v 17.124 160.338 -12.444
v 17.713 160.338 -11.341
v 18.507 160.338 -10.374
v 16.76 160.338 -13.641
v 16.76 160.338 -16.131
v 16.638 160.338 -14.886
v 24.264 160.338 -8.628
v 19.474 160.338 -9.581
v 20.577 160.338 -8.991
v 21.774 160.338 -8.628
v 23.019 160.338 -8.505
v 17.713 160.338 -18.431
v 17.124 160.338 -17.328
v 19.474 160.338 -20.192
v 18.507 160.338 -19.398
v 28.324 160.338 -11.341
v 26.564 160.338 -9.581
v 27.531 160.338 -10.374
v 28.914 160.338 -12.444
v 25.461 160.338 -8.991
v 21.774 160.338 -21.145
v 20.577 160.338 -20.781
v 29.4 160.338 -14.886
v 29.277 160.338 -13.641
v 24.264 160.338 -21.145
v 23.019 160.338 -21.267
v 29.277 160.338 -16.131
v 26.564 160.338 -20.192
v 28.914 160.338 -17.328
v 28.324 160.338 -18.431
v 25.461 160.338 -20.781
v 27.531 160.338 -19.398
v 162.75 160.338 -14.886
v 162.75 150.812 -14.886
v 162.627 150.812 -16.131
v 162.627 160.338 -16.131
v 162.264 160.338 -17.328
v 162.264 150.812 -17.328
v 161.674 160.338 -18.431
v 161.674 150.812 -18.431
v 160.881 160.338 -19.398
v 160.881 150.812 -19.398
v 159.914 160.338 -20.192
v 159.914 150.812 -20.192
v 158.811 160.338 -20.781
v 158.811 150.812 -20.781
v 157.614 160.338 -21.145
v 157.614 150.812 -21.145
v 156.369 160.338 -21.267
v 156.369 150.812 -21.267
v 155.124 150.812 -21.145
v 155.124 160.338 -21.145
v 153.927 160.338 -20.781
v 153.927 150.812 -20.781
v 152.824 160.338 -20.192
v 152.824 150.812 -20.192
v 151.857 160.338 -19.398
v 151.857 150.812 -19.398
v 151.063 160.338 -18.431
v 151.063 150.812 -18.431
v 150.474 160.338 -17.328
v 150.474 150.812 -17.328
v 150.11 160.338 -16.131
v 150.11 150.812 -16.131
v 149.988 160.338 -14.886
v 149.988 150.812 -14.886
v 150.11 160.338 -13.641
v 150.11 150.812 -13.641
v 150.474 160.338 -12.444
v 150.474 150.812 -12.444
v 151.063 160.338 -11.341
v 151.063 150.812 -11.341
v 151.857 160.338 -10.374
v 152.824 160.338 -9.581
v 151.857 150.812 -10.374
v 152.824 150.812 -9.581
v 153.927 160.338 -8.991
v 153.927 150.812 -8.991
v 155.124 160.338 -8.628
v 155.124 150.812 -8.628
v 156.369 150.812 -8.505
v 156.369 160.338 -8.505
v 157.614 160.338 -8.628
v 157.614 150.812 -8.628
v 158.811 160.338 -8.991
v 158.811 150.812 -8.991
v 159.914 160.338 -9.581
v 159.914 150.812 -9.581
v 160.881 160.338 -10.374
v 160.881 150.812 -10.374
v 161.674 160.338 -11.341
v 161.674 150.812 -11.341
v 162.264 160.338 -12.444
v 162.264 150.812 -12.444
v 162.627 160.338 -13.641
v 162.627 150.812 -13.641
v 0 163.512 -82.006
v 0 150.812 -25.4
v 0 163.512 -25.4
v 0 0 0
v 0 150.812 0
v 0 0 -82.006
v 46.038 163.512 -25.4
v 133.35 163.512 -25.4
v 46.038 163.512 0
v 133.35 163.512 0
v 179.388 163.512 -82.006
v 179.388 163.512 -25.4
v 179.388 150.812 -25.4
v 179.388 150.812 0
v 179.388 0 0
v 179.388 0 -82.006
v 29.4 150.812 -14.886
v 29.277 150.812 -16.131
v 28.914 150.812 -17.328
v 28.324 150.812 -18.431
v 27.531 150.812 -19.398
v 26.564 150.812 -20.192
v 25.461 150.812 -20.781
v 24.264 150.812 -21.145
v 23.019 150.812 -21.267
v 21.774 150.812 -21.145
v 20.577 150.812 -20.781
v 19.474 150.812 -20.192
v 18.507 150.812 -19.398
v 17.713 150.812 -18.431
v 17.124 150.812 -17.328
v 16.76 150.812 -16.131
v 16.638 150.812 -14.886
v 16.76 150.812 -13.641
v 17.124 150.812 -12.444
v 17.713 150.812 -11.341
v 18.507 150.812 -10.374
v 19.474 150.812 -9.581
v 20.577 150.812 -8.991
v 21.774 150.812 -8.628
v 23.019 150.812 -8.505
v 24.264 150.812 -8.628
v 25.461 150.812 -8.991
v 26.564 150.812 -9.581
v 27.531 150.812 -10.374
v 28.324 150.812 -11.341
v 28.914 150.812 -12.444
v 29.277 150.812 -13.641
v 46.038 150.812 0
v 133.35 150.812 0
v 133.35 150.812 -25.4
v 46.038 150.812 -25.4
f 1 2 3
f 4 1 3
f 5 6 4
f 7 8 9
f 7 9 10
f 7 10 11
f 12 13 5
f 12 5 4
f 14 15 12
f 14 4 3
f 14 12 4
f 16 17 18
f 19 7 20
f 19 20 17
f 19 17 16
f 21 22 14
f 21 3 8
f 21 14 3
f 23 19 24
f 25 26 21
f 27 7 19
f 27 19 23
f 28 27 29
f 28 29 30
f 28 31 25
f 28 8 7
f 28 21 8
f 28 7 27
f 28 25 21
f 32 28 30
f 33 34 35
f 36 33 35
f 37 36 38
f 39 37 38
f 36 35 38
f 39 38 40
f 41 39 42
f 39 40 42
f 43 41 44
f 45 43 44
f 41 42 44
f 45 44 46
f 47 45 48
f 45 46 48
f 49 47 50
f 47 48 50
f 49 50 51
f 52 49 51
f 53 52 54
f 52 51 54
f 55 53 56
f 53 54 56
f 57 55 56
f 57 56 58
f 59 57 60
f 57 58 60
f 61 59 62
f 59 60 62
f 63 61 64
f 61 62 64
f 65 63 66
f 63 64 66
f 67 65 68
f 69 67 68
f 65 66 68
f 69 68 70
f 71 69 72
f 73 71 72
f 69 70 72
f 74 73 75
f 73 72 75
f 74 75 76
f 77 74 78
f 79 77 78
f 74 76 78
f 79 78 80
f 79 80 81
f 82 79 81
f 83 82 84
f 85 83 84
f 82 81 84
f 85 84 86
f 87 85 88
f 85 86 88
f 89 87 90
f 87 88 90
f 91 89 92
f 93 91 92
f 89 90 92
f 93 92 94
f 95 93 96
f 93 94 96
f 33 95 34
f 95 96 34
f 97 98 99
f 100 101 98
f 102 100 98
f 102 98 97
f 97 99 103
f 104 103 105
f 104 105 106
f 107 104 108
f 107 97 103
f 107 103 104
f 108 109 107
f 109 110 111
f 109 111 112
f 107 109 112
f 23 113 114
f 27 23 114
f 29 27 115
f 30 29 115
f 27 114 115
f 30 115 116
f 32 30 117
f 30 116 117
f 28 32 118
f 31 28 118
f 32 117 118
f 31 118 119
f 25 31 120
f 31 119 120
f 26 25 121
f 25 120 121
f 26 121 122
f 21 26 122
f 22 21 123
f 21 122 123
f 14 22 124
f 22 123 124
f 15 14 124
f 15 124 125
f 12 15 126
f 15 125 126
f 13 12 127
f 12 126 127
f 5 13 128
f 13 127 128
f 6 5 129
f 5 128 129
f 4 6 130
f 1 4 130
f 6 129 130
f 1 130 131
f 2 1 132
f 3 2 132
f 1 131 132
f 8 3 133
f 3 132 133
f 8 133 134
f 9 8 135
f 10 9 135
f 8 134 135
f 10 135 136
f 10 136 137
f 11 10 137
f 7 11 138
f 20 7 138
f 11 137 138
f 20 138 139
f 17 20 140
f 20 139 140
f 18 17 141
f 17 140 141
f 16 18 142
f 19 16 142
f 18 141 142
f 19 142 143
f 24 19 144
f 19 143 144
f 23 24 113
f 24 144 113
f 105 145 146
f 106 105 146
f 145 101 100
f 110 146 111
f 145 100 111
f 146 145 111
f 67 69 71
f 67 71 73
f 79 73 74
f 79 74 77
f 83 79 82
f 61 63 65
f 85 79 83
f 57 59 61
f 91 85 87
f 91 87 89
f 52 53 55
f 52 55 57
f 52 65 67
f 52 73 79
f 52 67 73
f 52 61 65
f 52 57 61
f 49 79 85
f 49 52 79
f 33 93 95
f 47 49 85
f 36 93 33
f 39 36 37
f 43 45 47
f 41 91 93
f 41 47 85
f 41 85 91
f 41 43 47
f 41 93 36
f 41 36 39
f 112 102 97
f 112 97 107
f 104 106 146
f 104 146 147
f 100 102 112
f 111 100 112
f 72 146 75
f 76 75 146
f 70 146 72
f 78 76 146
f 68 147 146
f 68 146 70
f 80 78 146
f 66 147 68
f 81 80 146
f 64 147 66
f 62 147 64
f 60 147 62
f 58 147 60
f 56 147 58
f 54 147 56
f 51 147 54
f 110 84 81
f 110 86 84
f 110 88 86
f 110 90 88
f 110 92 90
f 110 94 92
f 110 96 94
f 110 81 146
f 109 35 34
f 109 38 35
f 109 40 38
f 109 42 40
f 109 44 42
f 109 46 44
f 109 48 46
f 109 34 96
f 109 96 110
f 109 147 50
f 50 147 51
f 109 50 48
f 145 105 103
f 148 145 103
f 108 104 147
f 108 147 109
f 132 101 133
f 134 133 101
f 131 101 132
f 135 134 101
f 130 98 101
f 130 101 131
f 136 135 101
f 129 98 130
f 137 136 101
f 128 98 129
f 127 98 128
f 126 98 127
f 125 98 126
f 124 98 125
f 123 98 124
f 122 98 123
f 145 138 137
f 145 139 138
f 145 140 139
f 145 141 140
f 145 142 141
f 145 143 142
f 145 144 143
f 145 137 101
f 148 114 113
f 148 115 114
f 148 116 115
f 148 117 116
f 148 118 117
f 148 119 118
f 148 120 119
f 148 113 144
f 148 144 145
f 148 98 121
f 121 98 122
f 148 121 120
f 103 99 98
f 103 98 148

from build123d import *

# Parameters (mm, degrees)
SKETCH1_W           = 179.3875
SKETCH1_H           = 82.005714286
BOSS_EXTRUDE1_DEPTH = 163.5125
SKETCH2_W           = 46.0375
SKETCH2_H           = 25.4
CUT_EXTRUDE1_DEPTH  = 12.7
SKETCH3_R           = 6.380960286
BOSS_EXTRUDE2_DEPTH = 9.525


with BuildPart() as part:
    # Sketch1 → Boss-Extrude1 (new body)
    with BuildSketch(Plane(origin=(0, 0, 0), x_dir=(1, 0, 0), z_dir=(0, 1, 0))):
        with Locations((89.69375, 41.002857143)):
            Rectangle(SKETCH1_W, SKETCH1_H)
    extrude(amount=BOSS_EXTRUDE1_DEPTH)

    # Sketch2 → Cut-Extrude1 (cut)
    with BuildSketch(Plane(origin=(0, 163.5125, 0), x_dir=(1, 0, 0), z_dir=(0, 1, 0))):
        with Locations((23.01875, 12.7)):
            Rectangle(SKETCH2_W, SKETCH2_H)
        with Locations((156.36875, 12.7)):
            Rectangle(SKETCH2_W, SKETCH2_H)
    extrude(amount=-CUT_EXTRUDE1_DEPTH, mode=Mode.SUBTRACT)

    # Sketch3 → Boss-Extrude2 (add)
    with BuildSketch(Plane(origin=(0, 150.8125, 0), x_dir=(1, 0, 0), z_dir=(0, 1, 0))):
        with Locations((23.01875, 14.886216264)):
            Circle(SKETCH3_R)
        with Locations((156.36875, 14.886216264)):
            Circle(SKETCH3_R)
    extrude(amount=BOSS_EXTRUDE2_DEPTH)


solid = part.part
